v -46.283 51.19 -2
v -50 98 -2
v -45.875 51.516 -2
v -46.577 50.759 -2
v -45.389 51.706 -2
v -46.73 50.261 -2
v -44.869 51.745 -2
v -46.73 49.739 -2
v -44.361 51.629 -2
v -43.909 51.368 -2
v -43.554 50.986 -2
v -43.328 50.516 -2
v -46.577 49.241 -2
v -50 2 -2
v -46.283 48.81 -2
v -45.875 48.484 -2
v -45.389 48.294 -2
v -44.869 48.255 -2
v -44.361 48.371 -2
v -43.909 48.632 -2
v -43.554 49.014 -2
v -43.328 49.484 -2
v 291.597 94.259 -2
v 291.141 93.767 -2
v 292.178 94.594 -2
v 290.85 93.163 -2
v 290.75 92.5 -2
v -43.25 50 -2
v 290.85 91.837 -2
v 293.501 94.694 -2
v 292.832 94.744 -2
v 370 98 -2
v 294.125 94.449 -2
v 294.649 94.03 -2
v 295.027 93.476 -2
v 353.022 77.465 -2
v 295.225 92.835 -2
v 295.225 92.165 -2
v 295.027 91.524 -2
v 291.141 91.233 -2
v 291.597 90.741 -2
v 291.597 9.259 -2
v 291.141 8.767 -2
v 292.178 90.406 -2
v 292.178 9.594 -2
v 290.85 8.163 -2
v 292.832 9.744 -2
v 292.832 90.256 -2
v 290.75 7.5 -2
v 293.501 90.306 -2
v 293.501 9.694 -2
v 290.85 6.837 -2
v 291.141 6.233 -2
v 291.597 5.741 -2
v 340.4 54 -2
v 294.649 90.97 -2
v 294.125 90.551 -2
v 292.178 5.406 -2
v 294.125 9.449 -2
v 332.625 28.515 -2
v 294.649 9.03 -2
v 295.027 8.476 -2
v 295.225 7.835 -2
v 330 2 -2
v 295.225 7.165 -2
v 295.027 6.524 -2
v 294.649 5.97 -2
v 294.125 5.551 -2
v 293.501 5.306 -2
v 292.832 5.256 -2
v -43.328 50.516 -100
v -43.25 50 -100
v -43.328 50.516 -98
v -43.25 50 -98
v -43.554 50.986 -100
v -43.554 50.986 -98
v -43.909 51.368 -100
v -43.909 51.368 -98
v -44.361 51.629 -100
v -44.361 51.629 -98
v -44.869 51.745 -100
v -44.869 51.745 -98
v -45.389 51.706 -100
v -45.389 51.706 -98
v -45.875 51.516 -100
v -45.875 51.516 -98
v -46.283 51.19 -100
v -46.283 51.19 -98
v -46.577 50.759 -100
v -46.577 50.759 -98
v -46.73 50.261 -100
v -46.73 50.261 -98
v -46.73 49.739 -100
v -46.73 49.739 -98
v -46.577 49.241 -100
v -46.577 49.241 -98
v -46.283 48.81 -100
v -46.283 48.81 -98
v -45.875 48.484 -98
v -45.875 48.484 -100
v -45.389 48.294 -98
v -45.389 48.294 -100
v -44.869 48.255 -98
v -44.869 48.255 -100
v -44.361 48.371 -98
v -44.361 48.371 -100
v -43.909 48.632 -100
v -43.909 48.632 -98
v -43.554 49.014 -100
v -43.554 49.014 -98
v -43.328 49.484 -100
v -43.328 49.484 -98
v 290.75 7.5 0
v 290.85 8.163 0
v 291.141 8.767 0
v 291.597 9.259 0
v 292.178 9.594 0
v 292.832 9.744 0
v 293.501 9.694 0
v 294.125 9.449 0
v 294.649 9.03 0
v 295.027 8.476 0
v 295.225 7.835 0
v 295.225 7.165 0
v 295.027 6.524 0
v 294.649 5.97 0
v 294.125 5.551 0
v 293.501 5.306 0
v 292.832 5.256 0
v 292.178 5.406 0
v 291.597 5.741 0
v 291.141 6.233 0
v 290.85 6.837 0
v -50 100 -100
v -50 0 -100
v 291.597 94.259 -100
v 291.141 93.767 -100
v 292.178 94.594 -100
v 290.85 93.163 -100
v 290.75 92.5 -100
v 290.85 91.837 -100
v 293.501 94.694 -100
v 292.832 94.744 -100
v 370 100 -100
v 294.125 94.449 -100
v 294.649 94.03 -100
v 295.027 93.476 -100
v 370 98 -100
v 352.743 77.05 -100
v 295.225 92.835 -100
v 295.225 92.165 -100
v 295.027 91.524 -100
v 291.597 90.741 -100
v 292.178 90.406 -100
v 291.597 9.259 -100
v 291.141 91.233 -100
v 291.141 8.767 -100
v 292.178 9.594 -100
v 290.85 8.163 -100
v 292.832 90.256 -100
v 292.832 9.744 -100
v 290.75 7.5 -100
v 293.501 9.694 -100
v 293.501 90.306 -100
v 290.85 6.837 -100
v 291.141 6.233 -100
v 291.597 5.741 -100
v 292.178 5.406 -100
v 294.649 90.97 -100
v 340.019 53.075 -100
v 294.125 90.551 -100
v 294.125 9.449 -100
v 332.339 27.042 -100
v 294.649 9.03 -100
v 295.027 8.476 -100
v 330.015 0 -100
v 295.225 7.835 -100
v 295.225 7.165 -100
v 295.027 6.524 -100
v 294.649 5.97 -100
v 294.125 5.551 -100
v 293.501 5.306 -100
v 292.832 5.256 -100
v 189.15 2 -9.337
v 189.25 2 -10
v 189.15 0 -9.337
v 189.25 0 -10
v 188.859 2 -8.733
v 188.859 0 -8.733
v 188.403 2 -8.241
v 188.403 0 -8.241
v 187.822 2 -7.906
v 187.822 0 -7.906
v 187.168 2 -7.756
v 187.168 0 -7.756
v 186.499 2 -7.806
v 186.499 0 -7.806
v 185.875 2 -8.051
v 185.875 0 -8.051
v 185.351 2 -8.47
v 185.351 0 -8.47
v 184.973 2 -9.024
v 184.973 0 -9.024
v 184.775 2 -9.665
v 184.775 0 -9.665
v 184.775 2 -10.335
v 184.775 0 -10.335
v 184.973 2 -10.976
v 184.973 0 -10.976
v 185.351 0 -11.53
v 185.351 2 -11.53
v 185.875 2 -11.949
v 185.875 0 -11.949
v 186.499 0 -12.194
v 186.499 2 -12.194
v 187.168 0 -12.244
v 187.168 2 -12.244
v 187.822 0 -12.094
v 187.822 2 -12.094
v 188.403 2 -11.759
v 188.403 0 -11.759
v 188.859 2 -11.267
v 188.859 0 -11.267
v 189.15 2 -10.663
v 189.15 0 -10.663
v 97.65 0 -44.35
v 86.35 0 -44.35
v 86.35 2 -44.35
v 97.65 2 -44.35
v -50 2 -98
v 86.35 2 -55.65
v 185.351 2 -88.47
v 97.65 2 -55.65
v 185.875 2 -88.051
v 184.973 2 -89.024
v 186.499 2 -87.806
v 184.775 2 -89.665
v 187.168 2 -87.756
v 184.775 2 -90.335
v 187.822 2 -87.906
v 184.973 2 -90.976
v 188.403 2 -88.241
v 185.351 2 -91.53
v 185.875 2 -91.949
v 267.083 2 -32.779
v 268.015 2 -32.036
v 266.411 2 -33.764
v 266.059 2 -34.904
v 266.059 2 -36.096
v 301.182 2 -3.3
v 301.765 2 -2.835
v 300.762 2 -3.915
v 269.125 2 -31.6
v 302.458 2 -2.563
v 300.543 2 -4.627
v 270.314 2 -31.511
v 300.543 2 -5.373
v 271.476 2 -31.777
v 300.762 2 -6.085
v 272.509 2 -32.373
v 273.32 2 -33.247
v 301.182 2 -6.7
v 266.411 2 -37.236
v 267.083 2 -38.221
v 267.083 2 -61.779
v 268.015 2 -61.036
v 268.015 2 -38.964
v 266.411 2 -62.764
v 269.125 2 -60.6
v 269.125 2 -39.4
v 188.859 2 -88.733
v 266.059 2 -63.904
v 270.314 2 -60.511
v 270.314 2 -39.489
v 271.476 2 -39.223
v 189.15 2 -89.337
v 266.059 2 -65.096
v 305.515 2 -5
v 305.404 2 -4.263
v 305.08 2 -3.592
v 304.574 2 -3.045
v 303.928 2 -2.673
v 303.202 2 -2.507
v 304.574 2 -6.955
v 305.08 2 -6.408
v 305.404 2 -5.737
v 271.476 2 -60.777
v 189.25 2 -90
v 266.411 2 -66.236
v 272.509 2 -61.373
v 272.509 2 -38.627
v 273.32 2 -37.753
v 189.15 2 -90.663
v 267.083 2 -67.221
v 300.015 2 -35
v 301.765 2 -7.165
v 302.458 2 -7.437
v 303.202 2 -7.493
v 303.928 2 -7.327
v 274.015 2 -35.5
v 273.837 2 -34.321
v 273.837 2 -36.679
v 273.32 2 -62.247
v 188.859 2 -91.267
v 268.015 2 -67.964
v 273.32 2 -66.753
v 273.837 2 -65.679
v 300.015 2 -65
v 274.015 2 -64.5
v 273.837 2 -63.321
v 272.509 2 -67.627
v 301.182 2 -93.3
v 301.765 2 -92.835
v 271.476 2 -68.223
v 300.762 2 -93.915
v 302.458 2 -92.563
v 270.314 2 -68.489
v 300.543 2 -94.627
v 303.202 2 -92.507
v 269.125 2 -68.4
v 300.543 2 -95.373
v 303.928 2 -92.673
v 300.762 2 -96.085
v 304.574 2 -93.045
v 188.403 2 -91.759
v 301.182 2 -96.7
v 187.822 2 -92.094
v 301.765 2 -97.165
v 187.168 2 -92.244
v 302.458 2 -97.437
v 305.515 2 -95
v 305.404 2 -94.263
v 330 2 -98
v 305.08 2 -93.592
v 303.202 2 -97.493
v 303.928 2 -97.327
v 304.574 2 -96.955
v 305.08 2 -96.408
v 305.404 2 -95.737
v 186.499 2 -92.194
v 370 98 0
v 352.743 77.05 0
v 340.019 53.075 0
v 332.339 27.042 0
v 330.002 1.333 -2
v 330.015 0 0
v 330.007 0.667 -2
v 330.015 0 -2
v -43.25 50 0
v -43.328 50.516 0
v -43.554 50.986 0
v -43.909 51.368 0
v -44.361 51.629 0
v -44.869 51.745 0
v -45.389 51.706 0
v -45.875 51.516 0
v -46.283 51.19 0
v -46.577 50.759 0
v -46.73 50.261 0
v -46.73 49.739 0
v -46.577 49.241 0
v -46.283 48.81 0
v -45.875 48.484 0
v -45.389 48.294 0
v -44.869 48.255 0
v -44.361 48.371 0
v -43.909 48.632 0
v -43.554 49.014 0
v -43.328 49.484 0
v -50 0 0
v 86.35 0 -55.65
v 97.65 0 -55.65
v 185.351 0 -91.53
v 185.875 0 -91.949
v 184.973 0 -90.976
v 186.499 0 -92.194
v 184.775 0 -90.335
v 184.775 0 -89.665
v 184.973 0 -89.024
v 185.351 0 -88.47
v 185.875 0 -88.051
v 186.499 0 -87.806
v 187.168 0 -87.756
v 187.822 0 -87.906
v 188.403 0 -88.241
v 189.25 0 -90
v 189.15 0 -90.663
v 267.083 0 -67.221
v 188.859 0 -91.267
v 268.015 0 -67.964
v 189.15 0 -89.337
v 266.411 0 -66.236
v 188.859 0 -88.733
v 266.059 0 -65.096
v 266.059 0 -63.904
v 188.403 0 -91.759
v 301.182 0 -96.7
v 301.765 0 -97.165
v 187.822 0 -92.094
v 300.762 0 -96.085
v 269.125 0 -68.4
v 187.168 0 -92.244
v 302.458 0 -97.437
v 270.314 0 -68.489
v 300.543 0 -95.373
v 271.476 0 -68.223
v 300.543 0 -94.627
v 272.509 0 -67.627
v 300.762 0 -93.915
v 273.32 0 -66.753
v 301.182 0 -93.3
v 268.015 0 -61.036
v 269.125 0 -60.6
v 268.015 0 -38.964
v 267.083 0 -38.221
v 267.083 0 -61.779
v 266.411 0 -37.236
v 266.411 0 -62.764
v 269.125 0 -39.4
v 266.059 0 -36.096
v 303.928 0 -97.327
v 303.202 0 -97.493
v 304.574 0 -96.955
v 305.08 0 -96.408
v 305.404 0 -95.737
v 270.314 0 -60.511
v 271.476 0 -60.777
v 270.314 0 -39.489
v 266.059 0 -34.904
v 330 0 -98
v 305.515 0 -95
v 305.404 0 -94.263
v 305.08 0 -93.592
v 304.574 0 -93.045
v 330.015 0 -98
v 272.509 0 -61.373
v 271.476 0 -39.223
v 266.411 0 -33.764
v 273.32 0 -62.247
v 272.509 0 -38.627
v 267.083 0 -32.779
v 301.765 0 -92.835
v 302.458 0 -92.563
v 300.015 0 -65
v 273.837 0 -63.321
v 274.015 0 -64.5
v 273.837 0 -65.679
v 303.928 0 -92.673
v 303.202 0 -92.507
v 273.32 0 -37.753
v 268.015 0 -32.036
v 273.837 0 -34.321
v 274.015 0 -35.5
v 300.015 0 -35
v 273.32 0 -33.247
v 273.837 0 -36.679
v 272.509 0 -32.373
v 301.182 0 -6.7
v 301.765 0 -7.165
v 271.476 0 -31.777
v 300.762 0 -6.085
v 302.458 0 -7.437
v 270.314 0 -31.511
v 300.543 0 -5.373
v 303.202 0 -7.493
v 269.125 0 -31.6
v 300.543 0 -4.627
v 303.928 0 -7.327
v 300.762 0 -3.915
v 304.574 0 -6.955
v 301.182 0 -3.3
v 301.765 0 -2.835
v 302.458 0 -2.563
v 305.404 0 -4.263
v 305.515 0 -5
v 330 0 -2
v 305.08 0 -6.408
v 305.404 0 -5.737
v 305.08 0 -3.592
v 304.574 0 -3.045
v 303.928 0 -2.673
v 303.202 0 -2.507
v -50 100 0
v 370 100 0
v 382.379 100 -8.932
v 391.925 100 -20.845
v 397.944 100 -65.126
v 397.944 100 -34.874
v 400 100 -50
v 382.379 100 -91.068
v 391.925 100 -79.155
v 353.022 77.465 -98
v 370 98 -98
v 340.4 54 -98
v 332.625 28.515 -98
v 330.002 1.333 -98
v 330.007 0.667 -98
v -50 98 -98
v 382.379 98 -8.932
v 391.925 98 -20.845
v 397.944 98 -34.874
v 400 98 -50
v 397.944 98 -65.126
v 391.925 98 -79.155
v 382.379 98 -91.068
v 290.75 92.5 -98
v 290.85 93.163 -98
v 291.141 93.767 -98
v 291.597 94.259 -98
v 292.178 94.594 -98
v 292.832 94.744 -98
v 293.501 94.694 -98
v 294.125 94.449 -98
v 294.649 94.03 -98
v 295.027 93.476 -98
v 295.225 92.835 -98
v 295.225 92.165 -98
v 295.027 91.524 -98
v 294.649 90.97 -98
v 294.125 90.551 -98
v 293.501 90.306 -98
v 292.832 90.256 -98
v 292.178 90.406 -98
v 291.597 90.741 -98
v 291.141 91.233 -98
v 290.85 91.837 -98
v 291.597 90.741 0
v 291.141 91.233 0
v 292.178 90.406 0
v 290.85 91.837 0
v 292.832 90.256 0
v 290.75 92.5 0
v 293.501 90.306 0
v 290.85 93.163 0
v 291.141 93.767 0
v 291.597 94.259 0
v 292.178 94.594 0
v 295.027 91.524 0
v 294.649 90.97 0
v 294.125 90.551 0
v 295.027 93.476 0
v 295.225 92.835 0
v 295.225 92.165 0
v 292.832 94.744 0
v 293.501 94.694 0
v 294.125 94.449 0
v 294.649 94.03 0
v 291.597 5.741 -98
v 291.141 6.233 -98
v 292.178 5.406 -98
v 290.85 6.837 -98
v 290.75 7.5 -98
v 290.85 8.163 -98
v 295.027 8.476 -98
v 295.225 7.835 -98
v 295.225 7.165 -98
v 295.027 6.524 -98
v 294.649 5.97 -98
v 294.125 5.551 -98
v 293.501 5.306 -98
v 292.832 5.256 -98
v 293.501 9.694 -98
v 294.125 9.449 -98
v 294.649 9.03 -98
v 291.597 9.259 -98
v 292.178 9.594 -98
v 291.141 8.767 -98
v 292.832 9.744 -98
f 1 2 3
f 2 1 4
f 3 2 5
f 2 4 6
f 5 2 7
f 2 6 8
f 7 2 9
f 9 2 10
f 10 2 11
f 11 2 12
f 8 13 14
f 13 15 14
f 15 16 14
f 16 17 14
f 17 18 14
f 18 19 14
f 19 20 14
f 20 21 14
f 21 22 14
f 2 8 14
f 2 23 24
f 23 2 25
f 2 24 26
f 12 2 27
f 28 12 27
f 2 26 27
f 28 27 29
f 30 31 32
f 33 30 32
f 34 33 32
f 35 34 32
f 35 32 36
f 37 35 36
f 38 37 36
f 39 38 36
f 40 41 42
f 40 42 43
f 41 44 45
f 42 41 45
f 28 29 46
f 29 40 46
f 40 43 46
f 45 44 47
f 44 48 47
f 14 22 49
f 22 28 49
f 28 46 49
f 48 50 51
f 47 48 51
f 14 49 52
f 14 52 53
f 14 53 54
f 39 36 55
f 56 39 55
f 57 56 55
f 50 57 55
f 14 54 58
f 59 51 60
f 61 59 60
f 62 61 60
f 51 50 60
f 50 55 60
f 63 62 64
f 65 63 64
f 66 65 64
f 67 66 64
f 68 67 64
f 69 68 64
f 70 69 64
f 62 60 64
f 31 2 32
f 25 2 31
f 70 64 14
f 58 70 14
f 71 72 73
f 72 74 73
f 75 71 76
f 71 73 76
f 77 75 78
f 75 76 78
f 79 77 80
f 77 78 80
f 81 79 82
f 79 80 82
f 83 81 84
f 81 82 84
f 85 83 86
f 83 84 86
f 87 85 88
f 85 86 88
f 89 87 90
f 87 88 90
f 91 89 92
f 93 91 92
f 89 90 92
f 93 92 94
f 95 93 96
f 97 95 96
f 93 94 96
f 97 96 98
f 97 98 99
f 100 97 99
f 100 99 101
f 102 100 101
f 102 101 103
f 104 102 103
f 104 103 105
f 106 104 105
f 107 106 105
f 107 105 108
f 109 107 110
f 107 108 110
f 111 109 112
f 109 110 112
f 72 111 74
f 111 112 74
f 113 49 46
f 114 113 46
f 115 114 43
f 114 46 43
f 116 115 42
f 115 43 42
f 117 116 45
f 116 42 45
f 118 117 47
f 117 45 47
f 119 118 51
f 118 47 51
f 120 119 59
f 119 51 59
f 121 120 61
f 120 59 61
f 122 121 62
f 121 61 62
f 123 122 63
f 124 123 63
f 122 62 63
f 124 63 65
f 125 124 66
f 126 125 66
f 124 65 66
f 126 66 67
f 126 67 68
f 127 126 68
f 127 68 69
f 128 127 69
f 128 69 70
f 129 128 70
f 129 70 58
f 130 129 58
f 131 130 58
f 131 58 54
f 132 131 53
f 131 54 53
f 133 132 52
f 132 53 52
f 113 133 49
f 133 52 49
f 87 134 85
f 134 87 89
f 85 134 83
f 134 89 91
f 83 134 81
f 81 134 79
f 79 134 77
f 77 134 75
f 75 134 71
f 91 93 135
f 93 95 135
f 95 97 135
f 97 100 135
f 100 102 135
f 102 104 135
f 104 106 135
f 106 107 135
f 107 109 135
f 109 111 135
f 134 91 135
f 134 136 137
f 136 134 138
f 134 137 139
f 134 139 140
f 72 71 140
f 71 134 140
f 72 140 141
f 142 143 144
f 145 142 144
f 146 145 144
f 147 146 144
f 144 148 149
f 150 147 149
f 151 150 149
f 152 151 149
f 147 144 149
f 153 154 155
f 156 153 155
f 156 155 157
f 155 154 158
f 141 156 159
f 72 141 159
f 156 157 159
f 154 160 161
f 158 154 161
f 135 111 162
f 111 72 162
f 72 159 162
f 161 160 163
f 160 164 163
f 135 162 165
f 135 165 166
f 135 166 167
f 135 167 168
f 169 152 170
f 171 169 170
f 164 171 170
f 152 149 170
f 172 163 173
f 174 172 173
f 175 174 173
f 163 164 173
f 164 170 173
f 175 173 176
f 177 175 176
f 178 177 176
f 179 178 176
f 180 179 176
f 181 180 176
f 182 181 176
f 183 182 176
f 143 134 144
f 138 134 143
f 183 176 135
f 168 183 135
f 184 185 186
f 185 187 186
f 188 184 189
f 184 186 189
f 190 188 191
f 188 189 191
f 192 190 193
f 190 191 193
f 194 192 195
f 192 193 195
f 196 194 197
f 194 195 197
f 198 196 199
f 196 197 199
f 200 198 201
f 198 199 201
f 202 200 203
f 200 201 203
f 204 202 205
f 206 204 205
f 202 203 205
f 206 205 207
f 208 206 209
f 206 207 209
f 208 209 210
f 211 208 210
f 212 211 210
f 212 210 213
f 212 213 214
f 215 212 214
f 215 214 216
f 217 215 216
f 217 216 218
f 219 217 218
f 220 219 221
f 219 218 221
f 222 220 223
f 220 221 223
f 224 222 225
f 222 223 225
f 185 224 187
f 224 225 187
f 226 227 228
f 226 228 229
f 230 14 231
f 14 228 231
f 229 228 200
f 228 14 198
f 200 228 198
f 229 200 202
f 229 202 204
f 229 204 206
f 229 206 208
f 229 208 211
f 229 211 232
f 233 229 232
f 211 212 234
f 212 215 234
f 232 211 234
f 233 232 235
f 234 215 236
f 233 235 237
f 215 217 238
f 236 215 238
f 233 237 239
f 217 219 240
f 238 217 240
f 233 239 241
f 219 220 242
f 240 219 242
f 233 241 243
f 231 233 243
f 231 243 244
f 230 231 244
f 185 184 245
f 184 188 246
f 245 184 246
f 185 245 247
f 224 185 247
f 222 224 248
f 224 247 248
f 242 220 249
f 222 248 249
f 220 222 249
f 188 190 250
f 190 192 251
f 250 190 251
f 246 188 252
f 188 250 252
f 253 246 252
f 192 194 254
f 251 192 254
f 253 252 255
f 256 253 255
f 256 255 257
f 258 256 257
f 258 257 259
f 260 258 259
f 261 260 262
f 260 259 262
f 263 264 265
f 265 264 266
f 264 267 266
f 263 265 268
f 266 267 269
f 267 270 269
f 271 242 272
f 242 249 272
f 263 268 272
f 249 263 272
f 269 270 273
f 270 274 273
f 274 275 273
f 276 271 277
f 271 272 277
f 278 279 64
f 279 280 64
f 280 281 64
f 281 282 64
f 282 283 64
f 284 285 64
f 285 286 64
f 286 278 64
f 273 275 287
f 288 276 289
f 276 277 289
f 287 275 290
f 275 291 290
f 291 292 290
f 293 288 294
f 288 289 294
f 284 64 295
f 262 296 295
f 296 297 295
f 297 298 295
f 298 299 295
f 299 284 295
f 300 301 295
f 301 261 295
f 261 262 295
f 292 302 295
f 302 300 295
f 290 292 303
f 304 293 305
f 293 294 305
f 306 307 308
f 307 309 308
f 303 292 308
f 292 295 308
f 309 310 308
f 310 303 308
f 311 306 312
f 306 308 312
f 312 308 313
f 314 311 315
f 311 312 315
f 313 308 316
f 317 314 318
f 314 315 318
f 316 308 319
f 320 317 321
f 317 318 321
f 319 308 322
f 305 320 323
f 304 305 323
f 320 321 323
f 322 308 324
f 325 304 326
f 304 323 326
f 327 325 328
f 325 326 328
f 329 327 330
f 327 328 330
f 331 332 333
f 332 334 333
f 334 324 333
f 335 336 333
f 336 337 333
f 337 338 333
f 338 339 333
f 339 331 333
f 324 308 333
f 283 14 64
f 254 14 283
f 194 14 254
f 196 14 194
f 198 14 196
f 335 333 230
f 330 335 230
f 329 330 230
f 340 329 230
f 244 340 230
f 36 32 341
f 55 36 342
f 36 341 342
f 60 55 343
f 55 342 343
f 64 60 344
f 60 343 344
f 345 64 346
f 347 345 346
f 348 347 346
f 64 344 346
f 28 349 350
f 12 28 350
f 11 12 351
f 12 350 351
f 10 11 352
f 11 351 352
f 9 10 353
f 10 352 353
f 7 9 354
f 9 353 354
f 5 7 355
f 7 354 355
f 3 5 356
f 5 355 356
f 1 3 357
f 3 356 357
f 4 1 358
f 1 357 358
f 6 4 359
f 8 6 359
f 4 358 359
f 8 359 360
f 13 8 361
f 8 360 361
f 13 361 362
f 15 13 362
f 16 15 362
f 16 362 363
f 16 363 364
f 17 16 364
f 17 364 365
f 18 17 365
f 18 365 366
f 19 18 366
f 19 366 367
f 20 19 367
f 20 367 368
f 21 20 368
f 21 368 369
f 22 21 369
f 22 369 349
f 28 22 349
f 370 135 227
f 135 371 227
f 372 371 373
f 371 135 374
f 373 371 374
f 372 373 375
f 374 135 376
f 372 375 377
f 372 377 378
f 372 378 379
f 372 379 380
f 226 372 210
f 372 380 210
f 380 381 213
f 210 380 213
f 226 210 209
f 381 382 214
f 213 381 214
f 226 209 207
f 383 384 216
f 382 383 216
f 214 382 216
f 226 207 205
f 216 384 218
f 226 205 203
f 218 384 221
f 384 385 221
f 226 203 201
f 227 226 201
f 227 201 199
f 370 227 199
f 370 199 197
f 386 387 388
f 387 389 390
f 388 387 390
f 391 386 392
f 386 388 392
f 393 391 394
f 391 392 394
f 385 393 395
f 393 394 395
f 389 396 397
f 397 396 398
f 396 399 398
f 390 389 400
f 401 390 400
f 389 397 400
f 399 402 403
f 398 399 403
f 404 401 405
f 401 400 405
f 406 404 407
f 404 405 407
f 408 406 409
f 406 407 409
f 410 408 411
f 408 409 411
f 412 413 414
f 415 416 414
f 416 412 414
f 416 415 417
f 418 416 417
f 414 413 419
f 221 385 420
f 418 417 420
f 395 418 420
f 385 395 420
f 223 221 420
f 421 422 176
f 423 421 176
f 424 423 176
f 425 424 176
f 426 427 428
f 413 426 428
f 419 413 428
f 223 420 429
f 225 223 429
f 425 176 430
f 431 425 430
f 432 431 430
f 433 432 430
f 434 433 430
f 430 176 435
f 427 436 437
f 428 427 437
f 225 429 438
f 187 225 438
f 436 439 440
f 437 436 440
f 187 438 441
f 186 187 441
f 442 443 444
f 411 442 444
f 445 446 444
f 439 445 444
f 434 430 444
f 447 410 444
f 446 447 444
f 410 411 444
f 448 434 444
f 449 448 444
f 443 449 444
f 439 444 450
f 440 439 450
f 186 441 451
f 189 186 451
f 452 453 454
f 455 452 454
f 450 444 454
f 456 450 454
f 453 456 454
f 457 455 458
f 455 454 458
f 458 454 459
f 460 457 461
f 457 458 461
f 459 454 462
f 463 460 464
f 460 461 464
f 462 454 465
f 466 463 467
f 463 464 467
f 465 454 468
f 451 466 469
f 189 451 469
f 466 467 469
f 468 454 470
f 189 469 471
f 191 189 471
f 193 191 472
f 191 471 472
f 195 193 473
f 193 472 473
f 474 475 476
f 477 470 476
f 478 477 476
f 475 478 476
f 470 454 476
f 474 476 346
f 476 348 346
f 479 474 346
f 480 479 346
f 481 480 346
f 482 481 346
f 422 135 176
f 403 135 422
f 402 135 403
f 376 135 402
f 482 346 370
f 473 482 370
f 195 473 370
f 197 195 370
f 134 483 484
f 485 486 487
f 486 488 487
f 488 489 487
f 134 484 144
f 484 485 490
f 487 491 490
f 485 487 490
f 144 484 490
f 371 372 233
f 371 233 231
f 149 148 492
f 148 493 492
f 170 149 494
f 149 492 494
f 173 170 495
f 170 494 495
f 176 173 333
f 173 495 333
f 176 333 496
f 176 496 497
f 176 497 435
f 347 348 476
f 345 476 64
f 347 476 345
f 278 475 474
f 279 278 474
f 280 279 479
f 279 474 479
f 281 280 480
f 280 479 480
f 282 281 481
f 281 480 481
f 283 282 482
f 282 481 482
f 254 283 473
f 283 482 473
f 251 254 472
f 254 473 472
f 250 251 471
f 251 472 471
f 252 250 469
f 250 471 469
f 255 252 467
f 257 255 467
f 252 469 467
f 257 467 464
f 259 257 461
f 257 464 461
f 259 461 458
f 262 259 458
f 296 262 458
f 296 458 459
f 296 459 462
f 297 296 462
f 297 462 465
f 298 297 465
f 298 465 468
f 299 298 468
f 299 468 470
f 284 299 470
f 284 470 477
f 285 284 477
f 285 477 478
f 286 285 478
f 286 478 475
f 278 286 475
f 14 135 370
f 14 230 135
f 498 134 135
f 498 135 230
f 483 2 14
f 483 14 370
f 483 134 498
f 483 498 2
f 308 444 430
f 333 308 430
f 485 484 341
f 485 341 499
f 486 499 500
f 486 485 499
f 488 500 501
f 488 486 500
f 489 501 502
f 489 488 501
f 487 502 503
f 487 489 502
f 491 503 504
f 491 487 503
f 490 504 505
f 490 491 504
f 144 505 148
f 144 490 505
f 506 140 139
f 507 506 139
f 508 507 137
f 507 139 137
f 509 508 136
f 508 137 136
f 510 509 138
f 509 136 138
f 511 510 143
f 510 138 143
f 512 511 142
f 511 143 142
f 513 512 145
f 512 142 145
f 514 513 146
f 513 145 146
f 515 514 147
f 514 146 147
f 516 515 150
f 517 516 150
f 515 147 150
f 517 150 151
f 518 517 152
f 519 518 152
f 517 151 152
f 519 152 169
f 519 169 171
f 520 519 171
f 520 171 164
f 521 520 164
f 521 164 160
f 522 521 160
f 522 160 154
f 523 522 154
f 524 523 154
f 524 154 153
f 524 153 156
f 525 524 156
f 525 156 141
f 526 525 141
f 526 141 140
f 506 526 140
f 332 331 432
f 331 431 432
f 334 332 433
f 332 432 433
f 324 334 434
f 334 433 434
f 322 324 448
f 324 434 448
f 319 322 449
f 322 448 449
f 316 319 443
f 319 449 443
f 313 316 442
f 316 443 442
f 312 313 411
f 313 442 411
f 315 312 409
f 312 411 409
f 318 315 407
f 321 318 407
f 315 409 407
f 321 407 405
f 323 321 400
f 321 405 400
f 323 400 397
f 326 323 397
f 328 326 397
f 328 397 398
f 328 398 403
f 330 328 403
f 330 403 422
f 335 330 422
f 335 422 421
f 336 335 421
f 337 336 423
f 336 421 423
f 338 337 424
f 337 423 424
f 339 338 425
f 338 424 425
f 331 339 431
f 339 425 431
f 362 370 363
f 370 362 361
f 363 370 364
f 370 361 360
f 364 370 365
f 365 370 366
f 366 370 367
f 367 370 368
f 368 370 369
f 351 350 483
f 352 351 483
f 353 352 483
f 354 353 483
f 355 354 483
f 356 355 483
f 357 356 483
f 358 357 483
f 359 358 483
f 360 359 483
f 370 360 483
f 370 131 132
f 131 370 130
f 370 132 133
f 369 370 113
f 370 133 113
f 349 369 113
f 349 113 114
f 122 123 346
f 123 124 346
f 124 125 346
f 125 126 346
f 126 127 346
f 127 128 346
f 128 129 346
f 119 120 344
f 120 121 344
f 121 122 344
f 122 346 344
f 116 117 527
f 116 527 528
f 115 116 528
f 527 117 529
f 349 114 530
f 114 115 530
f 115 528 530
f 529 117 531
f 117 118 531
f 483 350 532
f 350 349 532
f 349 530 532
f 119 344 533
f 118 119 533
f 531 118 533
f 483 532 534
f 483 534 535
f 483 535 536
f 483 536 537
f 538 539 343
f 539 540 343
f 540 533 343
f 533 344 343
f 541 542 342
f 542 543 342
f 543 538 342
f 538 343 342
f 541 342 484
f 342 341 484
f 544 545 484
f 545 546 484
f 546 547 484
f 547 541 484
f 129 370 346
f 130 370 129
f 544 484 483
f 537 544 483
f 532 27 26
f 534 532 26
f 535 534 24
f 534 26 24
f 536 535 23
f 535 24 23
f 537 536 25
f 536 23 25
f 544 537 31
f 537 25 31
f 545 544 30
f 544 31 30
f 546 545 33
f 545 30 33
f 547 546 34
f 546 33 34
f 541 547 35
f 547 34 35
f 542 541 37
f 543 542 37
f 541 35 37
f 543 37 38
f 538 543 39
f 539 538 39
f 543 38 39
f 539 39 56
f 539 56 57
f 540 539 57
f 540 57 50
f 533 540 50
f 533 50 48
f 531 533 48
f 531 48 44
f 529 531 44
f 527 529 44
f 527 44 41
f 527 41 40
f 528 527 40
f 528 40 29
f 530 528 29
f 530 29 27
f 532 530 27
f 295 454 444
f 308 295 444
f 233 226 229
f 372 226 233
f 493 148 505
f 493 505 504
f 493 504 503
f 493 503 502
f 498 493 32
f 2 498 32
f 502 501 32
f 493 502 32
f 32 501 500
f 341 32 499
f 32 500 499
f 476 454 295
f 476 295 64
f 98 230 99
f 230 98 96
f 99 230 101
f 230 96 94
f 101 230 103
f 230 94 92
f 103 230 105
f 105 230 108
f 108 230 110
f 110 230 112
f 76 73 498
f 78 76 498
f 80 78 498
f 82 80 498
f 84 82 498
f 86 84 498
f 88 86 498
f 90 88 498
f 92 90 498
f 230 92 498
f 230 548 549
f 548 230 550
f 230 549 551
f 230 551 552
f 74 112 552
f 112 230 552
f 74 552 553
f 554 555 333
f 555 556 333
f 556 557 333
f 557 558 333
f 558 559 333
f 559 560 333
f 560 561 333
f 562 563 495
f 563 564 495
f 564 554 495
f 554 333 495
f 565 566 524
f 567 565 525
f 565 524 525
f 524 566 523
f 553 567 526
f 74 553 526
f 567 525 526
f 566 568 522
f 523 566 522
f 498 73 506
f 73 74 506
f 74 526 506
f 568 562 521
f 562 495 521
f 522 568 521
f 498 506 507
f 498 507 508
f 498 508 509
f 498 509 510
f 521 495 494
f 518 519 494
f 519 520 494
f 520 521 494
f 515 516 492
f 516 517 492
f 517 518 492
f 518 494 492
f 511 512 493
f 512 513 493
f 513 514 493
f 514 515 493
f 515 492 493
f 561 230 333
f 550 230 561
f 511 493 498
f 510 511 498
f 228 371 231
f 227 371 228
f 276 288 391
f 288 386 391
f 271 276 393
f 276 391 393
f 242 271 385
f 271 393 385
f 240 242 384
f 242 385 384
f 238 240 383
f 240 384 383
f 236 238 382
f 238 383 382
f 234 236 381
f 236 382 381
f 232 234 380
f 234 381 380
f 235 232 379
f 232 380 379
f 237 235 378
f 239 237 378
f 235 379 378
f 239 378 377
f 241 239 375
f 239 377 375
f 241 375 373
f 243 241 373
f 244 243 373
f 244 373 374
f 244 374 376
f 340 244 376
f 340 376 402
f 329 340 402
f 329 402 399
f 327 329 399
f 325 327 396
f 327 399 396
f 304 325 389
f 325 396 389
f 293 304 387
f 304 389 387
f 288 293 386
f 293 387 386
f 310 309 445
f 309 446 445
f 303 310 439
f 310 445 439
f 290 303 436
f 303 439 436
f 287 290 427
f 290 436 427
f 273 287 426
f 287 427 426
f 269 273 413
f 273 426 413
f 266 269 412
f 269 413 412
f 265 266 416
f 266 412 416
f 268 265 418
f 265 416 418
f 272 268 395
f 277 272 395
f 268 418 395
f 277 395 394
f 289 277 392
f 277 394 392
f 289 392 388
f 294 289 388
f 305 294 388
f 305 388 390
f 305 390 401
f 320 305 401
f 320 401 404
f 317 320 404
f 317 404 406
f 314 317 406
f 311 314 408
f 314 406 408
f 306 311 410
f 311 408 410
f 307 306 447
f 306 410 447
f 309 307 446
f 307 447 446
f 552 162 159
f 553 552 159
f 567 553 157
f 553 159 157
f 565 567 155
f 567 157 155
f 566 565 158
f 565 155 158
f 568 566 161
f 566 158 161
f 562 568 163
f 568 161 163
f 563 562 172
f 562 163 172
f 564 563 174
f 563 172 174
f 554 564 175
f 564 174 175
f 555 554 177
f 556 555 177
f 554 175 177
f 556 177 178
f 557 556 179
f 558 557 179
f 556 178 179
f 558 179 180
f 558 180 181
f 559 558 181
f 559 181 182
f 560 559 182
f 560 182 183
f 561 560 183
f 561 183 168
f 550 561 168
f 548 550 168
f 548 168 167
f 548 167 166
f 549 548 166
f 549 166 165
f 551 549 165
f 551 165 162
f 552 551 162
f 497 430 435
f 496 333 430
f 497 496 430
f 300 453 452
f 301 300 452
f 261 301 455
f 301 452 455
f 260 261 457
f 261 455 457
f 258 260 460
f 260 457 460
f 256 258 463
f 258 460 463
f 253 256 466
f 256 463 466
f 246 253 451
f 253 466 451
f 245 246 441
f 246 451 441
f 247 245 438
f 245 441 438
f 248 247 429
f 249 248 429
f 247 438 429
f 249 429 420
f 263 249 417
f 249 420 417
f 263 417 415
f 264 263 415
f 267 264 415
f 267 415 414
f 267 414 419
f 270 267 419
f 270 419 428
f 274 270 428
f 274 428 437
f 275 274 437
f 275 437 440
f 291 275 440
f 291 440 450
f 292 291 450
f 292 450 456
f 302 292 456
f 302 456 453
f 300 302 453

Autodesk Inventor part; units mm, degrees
ref_plane "YZ Plane" through (0, 0, 0) normal (1, 0, 0) x (0, 1, 0)
ref_plane "XZ Plane" through (0, 0, 0) normal (0, 1, 0) x (-1, 0, 0)
ref_plane "XY Plane" through (0, 0, 0) normal (0, 0, 1) x (1, 0, 0)
sketch "Náčrt1" plane through (0, 0, 0) normal (1, 0, 0) x (0, 1, 0)
  line L0 (0, 0) -> (100, 0)
  line L1 (100, 0) -> (100, -100)
  line L2 (100, -100) -> (0, -100)
  line L3 (0, -100) -> (0, 0)
  line L4 (98, -2) -> (2, -2)
  line L5 (2, -2) -> (2, -98)
  line L6 (2, -98) -> (98, -98)
  line L7 (98, -98) -> (98, -2)
  dimension "d0" = 100
  dimension "d1" = 100
  dimension "d2" = 2
extrude "Vysunutí1" add sketch "Náčrt1" along normal blind 370
sketch "Náčrt4" plane through (0, 0, 0) normal (0, 0, 1) x (1, 0, 0)
  line L0 (0, 0) -> (0, 100) projected
  line L1 (0, 0) -> (370, 0) projected
  line L2 (370, 100) -> (370, 0) projected
  line L3 (0, 100) -> (370, 100) projected
  line L4 (0, 2) -> (370, 2) projected
  arc A0 (370, 98) -> (330.0148, 0) centre (465.2, 2) ccw
  line L5 (330, 23.5767) -> (330, -17.4459)
  line L6 (370, 2) -> (523.9799, 2)
  line L7 (330, 2) -> (370, 2)
  line L8 (0, 0) -> (370, 0) projected
  line L9 (370, 2) -> (370, 98)
  dimension "d17" = 2
  dimension "d102" = 330
extrude "Vysunutí4" cut sketch "Náčrt4" against normal through all contours A0 L2 L4 | L4 L2 L1 A0
sketch "Náčrt5" plane through (0, 100, 0) normal (0, 1, 0) x (1, 0, 0)
  line L0 (0, 0) -> (0, 100) projected
  line L1 (0, 0) -> (370, 0) projected
  line L2 (370, 100) -> (370, 0) projected
  line L3 (0, 100) -> (370, 100) projected
  arc A0 (370, 0) -> (370, 100) centre (343.3333, 50) ccw
  point P0 (400, 50)
  dimension "d21" = 30
extrude "Vysunutí5" add sketch "Náčrt5" against normal blind 2 contours L2 A0
sketch "Náčrt11" plane through (0, 0, -100) normal (0, -1, 0) x (1, 0, 0)
  line L0 (0, 100) -> (330.0148, 100) projected
  line L1 (0, 0) -> (0, 100) projected
  line L2 (0, 0) -> (330.0148, 0) projected
  line L3 (330.0148, 0) -> (330.0148, 100) projected
  line L4 (86.35, 55.65) -> (97.65, 55.65)
  line L5 (97.65, 55.65) -> (97.65, 44.35)
  line L6 (97.65, 44.35) -> (86.35, 44.35)
  line L7 (86.35, 44.35) -> (86.35, 55.65)
  point P0 (92, 55.65)
  point P1 (86.35, 50)
  dimension "d129" = 11.3
  dimension "d130" = 11.3
  dimension "d131" = 92
  dimension "d132" = 50
extrude "Vysunutí11" cut sketch "Náčrt11" against normal blind 5 contours L4 L5 L6 L7
sketch "Náčrt12" plane through (0, 0, -100) normal (0, -1, 0) x (1, 0, 0)
  line L0 (0, 100) -> (330.0148, 100) projected
  line L1 (0, 0) -> (0, 100) projected
  line L2 (0, 0) -> (330.0148, 0) projected
  circle A0 centre (187, 90) radius 2.25
  circle A1 centre (187, 10) radius 2.25
  line L3 (330.0148, 0) -> (330.0148, 100) projected
  dimension "d61" = 4.5
  dimension "d62" = 4.5
  dimension "d63" = 10
  dimension "d64" = 10
  dimension "d65" = 187
  dimension "d66" = 187
extrude "Vysunutí12" cut sketch "Náčrt12" against normal blind 10 contours A0 | A1
sketch "Náčrt14" plane through (0, 0, -100) normal (0, 0, -1) x (-1, 0, 0)
  line L0 (0, 0) -> (-330.0148, 0) projected
  line L1 (0, 100) -> (0, 0) projected
  line L2 (0, 100) -> (-370, 100) projected
  line L3 (-370, 98) -> (-370, 100) projected
  circle A0 centre (-293, 7.5) radius 2.25
  circle A1 centre (-293, 92.5) radius 2.25
  arc A2 (-330.0148, 0) -> (-370, 98) centre (-465.2, 2) ccw projected
  dimension "d77" = 293
  dimension "d78" = 4.5
  dimension "d79" = 4.5
  dimension "d80" = 293
  dimension "d86" = 85
  dimension "d87" = 7.5
extrude "Vysunutí14" cut sketch "Náčrt14" against normal through all contours A0 | A1
sketch "Náčrt16" plane through (0, 0, -100) normal (0, -1, 0) x (1, 0, 0)
  circle A0 centre (187, 90) radius 2.25 projected
  circle A1 centre (187, 10) radius 2.25 projected
  line L0 (330.0148, 0) -> (330.0148, 100) projected
  line L1 (0, 100) -> (330.0148, 100) projected
  line L2 (0, 0) -> (0, 100) projected
  line L3 (0, 0) -> (330.0148, 0) projected
  line L4 (0, 2) -> (330, 2) projected
  line L5 (0, 98) -> (330, 98) projected
  line L6 (300.0148, 65) -> (300.0148, 35)
  line L7 (300.0148, 35) -> (330, 2)
  line L8 (330, 2) -> (332.6841, 2)
  line L9 (332.6841, 2) -> (332.6841, 98)
  line L10 (332.6841, 98) -> (330, 98)
  line L11 (300.0148, 65) -> (330, 98)
  circle A2 centre (303.0148, 5) radius 2.5
  circle A3 centre (303.0148, 95) radius 2.5
  point P0 (300.0148, 50)
  dimension "d103" = 30
  dimension "d104" = 50
  dimension "d105" = 30
  dimension "d106" = 5
  dimension "d107" = 5
  dimension "d108" = 5
  dimension "d109" = 5
  dimension "d110" = 27
  dimension "d111" = 27
extrude "Vysunutí17" cut sketch "Náčrt16" against normal up to surface (2 mm away) contours L8 L7 L6 L11 L10 L0 | L0 L10 L9 L8 | A2 | A3
sketch "Náčrt17" plane through (0, 0, 0) normal (-1, 0, 0) x (0, 0, 1)
  line L0 (-98, 98) -> (-2, 98) projected
  line L1 (-2, 98) -> (-2, 2) projected
  line L2 (-2, 2) -> (-98, 2) projected
  line L3 (-98, 2) -> (-98, 98) projected
  line L4 (0, 0) -> (0, 100) projected
  line L5 (0, 100) -> (-100, 100) projected
  line L6 (-100, 100) -> (-100, 0) projected
  line L7 (-100, 0) -> (0, 0) projected
extrude "Vysunutí18" add sketch "Náčrt17" along normal blind 50
sketch "Náčrt18" plane through (-50, 100, 0) normal (0, 0, 1) x (1, 0, 0)
  arc A0 (420, -2) -> (380.0148, -100) centre (515.2, -98) ccw projected
  line L0 (420, 0) -> (420, -2) projected
  line L1 (420, 0) -> (0, 0) projected
  line L2 (0, -100) -> (0, 0) projected
  line L3 (0, -100) -> (380.0148, -100) projected
  circle A1 centre (5, -50) radius 1.75
  point P0 (50, -100)
  dimension "d116" = 3.5
  dimension "d117" = 50
  dimension "d118" = 5
extrude "Vysunutí19" cut sketch "Náčrt18" against normal through all contours A1
sketch "Náčrt19" plane through (300.0148, 0, -65) normal (0, -1, 0) x (1, 0, 0)
  line L0 (29.9852, 63) -> (30, 63) projected
  line L1 (30, 63) -> (30, 65) projected
  line L2 (-350.0148, 65) -> (30, 65) projected
  line L3 (-350.0148, -35) -> (-350.0148, 65) projected
  line L4 (30, -35) -> (-350.0148, -35) projected
  line L5 (30, -35) -> (30, -33) projected
  line L6 (30, -33) -> (29.9852, -33) projected
  line L7 (29.9852, -33) -> (0, 0) projected
  line L8 (0, 0) -> (0, 30) projected
  line L9 (0, 30) -> (29.9852, 63) projected
  circle A0 centre (3, 60) radius 2.5 projected
  circle A1 centre (3, -30) radius 2.5 projected
  circle A2 centre (-113.0148, 55) radius 2.25 projected
  circle A3 centre (-113.0148, -25) radius 2.25 projected
  circle A4 centre (-30, 29.5) radius 4
  circle A5 centre (-30, 0.5) radius 4
  point P0 (-300.0148, 65)
  dimension "d121" = 8
  dimension "d122" = 8
  dimension "d123" = 29
  dimension "d124" = 35.5
  dimension "d125" = 30
  dimension "d126" = 30
extrude "Vysunutí20" cut sketch "Náčrt19" against normal blind 10 contours A4 | A5
properties part number "Case"
